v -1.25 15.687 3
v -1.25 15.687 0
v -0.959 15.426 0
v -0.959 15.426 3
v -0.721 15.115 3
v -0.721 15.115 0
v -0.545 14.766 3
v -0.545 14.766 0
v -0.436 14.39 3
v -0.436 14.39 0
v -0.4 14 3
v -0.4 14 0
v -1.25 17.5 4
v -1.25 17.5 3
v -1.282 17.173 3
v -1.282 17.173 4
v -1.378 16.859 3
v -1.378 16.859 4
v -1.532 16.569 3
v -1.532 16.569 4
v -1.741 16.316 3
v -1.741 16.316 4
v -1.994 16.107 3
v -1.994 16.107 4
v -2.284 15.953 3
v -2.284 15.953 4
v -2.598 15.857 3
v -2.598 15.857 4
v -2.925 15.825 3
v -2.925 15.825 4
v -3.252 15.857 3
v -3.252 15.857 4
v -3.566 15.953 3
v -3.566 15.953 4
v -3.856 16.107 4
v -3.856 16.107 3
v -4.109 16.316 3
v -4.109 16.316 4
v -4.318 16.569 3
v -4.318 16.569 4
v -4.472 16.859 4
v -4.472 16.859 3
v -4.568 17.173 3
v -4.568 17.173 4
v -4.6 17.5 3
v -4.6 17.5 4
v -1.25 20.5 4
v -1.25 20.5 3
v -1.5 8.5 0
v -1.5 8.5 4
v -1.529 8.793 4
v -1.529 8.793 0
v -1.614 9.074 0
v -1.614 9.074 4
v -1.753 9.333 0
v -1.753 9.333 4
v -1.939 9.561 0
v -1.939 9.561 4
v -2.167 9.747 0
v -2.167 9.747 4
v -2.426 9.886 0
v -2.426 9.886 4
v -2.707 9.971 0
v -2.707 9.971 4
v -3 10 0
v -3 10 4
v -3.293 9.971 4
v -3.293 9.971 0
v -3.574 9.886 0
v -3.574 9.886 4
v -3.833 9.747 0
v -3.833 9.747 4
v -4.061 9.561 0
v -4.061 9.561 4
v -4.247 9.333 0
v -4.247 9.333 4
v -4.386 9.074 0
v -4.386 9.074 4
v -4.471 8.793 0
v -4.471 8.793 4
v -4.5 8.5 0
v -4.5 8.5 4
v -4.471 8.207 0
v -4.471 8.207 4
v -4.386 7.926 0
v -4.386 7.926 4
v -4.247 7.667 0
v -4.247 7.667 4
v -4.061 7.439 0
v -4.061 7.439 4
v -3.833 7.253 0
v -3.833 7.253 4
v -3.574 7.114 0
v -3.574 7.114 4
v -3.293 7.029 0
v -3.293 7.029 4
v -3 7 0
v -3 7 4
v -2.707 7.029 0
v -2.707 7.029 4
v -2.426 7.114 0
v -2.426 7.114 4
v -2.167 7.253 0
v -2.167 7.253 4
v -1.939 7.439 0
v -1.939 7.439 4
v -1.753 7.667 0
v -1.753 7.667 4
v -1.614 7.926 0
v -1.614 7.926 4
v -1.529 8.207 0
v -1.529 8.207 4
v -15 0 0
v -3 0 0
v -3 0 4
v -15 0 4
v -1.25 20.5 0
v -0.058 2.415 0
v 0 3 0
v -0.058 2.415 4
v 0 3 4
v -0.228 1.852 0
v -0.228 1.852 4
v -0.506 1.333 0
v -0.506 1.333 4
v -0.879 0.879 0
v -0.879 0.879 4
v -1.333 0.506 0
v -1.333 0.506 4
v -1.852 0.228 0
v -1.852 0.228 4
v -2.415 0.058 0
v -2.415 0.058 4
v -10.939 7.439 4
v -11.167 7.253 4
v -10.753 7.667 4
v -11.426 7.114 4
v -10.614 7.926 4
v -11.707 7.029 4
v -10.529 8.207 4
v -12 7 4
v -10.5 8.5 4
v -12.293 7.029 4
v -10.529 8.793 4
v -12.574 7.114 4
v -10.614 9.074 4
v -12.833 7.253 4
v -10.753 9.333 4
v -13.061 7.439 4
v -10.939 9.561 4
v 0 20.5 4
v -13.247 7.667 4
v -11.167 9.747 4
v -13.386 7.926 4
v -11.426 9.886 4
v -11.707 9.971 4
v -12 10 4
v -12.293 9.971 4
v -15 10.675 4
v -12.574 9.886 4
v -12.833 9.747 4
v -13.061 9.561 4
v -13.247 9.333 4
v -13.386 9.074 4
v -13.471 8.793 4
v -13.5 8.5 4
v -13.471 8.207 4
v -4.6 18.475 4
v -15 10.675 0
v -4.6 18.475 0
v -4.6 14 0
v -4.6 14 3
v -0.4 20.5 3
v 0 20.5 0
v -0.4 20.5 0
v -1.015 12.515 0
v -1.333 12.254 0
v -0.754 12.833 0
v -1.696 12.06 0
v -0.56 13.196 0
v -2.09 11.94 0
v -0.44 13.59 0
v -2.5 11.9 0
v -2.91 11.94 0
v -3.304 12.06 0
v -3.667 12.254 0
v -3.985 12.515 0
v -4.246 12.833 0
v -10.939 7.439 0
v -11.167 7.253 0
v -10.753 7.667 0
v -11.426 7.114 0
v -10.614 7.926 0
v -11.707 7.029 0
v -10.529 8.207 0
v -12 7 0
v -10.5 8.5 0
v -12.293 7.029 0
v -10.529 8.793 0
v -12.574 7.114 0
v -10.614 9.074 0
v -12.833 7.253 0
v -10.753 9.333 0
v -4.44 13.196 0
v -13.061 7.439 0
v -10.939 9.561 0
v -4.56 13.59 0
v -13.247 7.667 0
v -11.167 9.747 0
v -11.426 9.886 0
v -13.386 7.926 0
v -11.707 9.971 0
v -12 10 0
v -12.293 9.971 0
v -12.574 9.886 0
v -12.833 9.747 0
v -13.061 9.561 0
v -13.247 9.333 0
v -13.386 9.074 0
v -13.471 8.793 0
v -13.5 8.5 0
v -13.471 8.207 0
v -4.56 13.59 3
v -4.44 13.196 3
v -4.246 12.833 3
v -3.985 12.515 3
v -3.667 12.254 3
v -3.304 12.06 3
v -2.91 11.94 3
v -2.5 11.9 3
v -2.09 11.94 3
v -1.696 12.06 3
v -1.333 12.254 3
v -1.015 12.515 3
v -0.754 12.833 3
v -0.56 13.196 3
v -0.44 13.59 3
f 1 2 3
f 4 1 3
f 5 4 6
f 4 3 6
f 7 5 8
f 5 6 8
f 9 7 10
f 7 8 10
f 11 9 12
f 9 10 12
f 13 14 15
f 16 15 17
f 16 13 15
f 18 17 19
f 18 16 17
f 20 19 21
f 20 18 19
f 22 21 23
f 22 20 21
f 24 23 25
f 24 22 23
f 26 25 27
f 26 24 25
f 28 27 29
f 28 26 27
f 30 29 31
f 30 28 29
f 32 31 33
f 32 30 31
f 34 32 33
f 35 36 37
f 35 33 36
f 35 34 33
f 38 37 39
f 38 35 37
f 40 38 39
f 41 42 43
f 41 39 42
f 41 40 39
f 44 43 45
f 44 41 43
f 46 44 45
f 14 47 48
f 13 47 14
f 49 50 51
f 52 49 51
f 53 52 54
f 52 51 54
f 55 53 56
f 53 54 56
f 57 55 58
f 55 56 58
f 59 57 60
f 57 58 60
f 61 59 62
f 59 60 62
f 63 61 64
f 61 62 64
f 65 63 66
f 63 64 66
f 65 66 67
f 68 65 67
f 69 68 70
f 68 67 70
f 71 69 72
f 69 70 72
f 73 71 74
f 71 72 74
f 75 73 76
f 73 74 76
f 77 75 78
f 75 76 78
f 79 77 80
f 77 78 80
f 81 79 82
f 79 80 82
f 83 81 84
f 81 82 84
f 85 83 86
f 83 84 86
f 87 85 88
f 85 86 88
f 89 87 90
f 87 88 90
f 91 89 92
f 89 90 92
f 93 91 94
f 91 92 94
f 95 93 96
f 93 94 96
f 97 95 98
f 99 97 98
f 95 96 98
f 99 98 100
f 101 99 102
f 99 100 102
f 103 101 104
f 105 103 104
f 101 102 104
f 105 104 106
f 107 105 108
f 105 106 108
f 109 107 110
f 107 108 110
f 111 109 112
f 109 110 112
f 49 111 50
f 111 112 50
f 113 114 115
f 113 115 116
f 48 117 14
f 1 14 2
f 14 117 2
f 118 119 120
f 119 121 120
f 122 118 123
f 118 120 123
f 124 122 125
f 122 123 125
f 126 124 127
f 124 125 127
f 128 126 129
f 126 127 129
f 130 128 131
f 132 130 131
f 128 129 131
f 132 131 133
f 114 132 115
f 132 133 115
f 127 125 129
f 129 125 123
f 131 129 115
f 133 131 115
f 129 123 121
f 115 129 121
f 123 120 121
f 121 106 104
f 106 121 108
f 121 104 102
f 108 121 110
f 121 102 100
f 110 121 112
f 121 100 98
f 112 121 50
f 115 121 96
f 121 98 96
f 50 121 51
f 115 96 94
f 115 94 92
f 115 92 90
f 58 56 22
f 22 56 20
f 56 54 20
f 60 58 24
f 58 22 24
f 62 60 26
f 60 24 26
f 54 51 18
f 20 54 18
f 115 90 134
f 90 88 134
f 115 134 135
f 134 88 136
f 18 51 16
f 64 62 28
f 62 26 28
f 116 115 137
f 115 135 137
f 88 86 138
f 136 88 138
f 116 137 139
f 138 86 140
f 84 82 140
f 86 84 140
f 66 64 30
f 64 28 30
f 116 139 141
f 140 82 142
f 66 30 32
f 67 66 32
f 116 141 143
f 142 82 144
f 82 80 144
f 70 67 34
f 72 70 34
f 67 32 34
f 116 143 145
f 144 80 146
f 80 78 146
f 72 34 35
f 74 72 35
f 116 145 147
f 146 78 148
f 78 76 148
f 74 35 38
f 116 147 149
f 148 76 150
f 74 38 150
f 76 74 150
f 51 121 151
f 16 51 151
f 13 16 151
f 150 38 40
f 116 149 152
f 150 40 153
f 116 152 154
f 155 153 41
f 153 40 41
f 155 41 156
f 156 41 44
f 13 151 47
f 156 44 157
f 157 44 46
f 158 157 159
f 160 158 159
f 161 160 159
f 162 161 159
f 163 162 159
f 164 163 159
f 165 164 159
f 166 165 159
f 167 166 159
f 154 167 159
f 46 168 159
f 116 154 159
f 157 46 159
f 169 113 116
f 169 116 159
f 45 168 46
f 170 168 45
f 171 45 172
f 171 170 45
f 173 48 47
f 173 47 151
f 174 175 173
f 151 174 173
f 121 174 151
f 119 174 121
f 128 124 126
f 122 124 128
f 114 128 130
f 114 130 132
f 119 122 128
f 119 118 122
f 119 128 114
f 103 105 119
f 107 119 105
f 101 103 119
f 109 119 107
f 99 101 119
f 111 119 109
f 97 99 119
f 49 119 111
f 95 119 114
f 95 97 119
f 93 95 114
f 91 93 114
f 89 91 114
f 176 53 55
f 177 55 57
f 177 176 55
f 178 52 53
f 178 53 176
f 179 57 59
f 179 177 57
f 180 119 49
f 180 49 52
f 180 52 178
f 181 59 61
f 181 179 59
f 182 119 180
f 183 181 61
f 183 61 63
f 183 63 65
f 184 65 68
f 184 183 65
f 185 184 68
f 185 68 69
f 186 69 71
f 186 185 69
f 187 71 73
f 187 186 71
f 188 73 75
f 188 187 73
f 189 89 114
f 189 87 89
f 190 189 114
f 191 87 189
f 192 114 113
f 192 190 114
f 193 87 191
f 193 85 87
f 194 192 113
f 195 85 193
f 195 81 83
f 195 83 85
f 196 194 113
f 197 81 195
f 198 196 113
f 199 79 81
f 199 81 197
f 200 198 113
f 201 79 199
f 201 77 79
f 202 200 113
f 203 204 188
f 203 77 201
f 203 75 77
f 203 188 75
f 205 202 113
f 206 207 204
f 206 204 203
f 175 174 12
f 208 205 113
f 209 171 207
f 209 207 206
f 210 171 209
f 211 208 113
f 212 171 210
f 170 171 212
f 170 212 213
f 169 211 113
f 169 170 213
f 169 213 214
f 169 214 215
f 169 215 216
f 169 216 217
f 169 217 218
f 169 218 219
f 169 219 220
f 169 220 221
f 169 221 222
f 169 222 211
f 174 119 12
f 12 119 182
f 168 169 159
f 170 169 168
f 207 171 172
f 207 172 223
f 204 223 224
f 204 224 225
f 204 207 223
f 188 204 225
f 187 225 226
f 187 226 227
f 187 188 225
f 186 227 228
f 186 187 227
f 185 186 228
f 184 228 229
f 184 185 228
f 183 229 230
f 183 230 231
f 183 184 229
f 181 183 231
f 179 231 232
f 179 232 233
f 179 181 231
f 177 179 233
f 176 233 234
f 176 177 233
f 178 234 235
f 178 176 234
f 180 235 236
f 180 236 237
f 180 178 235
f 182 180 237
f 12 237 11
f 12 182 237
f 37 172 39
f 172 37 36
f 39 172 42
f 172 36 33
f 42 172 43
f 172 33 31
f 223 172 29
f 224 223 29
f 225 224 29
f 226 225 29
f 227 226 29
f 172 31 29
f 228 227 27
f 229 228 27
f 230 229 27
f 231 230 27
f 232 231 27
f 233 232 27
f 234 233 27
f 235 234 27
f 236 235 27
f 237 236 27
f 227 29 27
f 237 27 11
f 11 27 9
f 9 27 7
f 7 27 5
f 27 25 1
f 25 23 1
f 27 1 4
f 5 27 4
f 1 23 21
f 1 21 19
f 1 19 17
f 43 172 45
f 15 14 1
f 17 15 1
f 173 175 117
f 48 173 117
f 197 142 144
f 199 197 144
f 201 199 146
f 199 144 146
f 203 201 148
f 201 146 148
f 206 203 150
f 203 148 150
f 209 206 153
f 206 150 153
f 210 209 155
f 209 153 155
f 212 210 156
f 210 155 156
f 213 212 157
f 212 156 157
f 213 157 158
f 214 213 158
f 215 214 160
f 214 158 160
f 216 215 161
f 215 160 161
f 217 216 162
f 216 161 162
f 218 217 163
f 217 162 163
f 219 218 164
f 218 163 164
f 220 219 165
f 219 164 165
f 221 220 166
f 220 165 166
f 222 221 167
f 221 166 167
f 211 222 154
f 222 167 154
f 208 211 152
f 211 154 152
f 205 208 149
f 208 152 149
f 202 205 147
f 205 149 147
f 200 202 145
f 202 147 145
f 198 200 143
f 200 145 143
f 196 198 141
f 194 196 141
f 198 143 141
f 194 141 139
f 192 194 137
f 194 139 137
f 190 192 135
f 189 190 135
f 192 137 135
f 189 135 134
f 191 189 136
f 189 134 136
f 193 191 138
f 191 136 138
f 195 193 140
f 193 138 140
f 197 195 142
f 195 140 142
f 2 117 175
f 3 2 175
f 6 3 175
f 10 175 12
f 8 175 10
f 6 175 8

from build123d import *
from build123d.topology import SkipClean

# Parameters (mm, degrees)
EXTRUDE1_DEPTH = 4
EXTRUDE2_DEPTH = 3
SKETCH4_R      = 1.5
EXTRUDE3_DEPTH = 4
FILLET3_R      = 3
EXTRUDE4_DEPTH = 4
EXTRUDE6_DEPTH = 3


with BuildPart() as part:
    # Sketch1 → Extrude1 (new body)
    with BuildSketch(Plane.XY):
        Polygon((0, 20.5), (0, 0), (-15, 0), (-15, 10.675), (-1.9, 20.5), align=None)
    extrude(amount=EXTRUDE1_DEPTH)

    # Sketch2 → Extrude2 (cut)
    with BuildSketch(Plane(origin=(0, 0, 0), x_dir=(-1, 0, 0), z_dir=(0, 0, -1))):
        with BuildLine():
            Line((0.4, 14), (0.4, 21.525360588))
            Line((0.4, 21.525360588), (4.6, 21.525360588))
            Line((4.6, 21.525360588), (4.6, 14))
            ThreePointArc((4.6, 14), (2.5, 11.9), (0.4, 14))
        make_face()
    extrude(amount=-EXTRUDE2_DEPTH, mode=Mode.SUBTRACT)

    # Sketch4 → Extrude3 (cut)
    with BuildSketch(Plane.XY.offset(4)):
        with Locations((-3, 8.5)):
            Circle(SKETCH4_R)
        with Locations((-12, 8.5)):
            Circle(SKETCH4_R)
    extrude(amount=-EXTRUDE3_DEPTH, mode=Mode.SUBTRACT)

    # Fillet3
    fillet3_edges = [part.edges().sort_by_distance(p)[0] for p in [
        (0, 0, 2),
    ]]
    fillet(fillet3_edges, radius=FILLET3_R)

    # Sketch5 → Extrude4 (cut)
    with BuildSketch(Plane.XY.offset(4)):
        with BuildLine():
            Line((-1.25, 23.386660478), (-1.25, 17.5))
            ThreePointArc((-1.25, 17.5), (-2.925, 15.825), (-4.6, 17.5))
            Line((-4.6, 17.5), (-4.6, 23.386660478))
            Line((-4.6, 23.386660478), (-1.25, 23.386660478))
        make_face()
    extrude(amount=-EXTRUDE4_DEPTH, mode=Mode.SUBTRACT)

    # Sketch8 → Extrude6 (add)
    with SkipClean():  # the faces are left unmerged after this step: merging them gives an invalid solid
        with BuildSketch(Plane(origin=(0, 0, 0), x_dir=(-1, 0, 0), z_dir=(0, 0, -1))):
            with BuildLine():
                Line((0.4, 20.5), (1.25, 20.5))
                Line((1.25, 20.5), (1.25, 15.687453703))
                ThreePointArc((1.25, 15.687453703), (0.624500067, 14.944722181), (0.4, 14))
                Line((0.4, 14), (0.4, 20.5))
            make_face()
        extrude(amount=-EXTRUDE6_DEPTH)


solid = part.part
